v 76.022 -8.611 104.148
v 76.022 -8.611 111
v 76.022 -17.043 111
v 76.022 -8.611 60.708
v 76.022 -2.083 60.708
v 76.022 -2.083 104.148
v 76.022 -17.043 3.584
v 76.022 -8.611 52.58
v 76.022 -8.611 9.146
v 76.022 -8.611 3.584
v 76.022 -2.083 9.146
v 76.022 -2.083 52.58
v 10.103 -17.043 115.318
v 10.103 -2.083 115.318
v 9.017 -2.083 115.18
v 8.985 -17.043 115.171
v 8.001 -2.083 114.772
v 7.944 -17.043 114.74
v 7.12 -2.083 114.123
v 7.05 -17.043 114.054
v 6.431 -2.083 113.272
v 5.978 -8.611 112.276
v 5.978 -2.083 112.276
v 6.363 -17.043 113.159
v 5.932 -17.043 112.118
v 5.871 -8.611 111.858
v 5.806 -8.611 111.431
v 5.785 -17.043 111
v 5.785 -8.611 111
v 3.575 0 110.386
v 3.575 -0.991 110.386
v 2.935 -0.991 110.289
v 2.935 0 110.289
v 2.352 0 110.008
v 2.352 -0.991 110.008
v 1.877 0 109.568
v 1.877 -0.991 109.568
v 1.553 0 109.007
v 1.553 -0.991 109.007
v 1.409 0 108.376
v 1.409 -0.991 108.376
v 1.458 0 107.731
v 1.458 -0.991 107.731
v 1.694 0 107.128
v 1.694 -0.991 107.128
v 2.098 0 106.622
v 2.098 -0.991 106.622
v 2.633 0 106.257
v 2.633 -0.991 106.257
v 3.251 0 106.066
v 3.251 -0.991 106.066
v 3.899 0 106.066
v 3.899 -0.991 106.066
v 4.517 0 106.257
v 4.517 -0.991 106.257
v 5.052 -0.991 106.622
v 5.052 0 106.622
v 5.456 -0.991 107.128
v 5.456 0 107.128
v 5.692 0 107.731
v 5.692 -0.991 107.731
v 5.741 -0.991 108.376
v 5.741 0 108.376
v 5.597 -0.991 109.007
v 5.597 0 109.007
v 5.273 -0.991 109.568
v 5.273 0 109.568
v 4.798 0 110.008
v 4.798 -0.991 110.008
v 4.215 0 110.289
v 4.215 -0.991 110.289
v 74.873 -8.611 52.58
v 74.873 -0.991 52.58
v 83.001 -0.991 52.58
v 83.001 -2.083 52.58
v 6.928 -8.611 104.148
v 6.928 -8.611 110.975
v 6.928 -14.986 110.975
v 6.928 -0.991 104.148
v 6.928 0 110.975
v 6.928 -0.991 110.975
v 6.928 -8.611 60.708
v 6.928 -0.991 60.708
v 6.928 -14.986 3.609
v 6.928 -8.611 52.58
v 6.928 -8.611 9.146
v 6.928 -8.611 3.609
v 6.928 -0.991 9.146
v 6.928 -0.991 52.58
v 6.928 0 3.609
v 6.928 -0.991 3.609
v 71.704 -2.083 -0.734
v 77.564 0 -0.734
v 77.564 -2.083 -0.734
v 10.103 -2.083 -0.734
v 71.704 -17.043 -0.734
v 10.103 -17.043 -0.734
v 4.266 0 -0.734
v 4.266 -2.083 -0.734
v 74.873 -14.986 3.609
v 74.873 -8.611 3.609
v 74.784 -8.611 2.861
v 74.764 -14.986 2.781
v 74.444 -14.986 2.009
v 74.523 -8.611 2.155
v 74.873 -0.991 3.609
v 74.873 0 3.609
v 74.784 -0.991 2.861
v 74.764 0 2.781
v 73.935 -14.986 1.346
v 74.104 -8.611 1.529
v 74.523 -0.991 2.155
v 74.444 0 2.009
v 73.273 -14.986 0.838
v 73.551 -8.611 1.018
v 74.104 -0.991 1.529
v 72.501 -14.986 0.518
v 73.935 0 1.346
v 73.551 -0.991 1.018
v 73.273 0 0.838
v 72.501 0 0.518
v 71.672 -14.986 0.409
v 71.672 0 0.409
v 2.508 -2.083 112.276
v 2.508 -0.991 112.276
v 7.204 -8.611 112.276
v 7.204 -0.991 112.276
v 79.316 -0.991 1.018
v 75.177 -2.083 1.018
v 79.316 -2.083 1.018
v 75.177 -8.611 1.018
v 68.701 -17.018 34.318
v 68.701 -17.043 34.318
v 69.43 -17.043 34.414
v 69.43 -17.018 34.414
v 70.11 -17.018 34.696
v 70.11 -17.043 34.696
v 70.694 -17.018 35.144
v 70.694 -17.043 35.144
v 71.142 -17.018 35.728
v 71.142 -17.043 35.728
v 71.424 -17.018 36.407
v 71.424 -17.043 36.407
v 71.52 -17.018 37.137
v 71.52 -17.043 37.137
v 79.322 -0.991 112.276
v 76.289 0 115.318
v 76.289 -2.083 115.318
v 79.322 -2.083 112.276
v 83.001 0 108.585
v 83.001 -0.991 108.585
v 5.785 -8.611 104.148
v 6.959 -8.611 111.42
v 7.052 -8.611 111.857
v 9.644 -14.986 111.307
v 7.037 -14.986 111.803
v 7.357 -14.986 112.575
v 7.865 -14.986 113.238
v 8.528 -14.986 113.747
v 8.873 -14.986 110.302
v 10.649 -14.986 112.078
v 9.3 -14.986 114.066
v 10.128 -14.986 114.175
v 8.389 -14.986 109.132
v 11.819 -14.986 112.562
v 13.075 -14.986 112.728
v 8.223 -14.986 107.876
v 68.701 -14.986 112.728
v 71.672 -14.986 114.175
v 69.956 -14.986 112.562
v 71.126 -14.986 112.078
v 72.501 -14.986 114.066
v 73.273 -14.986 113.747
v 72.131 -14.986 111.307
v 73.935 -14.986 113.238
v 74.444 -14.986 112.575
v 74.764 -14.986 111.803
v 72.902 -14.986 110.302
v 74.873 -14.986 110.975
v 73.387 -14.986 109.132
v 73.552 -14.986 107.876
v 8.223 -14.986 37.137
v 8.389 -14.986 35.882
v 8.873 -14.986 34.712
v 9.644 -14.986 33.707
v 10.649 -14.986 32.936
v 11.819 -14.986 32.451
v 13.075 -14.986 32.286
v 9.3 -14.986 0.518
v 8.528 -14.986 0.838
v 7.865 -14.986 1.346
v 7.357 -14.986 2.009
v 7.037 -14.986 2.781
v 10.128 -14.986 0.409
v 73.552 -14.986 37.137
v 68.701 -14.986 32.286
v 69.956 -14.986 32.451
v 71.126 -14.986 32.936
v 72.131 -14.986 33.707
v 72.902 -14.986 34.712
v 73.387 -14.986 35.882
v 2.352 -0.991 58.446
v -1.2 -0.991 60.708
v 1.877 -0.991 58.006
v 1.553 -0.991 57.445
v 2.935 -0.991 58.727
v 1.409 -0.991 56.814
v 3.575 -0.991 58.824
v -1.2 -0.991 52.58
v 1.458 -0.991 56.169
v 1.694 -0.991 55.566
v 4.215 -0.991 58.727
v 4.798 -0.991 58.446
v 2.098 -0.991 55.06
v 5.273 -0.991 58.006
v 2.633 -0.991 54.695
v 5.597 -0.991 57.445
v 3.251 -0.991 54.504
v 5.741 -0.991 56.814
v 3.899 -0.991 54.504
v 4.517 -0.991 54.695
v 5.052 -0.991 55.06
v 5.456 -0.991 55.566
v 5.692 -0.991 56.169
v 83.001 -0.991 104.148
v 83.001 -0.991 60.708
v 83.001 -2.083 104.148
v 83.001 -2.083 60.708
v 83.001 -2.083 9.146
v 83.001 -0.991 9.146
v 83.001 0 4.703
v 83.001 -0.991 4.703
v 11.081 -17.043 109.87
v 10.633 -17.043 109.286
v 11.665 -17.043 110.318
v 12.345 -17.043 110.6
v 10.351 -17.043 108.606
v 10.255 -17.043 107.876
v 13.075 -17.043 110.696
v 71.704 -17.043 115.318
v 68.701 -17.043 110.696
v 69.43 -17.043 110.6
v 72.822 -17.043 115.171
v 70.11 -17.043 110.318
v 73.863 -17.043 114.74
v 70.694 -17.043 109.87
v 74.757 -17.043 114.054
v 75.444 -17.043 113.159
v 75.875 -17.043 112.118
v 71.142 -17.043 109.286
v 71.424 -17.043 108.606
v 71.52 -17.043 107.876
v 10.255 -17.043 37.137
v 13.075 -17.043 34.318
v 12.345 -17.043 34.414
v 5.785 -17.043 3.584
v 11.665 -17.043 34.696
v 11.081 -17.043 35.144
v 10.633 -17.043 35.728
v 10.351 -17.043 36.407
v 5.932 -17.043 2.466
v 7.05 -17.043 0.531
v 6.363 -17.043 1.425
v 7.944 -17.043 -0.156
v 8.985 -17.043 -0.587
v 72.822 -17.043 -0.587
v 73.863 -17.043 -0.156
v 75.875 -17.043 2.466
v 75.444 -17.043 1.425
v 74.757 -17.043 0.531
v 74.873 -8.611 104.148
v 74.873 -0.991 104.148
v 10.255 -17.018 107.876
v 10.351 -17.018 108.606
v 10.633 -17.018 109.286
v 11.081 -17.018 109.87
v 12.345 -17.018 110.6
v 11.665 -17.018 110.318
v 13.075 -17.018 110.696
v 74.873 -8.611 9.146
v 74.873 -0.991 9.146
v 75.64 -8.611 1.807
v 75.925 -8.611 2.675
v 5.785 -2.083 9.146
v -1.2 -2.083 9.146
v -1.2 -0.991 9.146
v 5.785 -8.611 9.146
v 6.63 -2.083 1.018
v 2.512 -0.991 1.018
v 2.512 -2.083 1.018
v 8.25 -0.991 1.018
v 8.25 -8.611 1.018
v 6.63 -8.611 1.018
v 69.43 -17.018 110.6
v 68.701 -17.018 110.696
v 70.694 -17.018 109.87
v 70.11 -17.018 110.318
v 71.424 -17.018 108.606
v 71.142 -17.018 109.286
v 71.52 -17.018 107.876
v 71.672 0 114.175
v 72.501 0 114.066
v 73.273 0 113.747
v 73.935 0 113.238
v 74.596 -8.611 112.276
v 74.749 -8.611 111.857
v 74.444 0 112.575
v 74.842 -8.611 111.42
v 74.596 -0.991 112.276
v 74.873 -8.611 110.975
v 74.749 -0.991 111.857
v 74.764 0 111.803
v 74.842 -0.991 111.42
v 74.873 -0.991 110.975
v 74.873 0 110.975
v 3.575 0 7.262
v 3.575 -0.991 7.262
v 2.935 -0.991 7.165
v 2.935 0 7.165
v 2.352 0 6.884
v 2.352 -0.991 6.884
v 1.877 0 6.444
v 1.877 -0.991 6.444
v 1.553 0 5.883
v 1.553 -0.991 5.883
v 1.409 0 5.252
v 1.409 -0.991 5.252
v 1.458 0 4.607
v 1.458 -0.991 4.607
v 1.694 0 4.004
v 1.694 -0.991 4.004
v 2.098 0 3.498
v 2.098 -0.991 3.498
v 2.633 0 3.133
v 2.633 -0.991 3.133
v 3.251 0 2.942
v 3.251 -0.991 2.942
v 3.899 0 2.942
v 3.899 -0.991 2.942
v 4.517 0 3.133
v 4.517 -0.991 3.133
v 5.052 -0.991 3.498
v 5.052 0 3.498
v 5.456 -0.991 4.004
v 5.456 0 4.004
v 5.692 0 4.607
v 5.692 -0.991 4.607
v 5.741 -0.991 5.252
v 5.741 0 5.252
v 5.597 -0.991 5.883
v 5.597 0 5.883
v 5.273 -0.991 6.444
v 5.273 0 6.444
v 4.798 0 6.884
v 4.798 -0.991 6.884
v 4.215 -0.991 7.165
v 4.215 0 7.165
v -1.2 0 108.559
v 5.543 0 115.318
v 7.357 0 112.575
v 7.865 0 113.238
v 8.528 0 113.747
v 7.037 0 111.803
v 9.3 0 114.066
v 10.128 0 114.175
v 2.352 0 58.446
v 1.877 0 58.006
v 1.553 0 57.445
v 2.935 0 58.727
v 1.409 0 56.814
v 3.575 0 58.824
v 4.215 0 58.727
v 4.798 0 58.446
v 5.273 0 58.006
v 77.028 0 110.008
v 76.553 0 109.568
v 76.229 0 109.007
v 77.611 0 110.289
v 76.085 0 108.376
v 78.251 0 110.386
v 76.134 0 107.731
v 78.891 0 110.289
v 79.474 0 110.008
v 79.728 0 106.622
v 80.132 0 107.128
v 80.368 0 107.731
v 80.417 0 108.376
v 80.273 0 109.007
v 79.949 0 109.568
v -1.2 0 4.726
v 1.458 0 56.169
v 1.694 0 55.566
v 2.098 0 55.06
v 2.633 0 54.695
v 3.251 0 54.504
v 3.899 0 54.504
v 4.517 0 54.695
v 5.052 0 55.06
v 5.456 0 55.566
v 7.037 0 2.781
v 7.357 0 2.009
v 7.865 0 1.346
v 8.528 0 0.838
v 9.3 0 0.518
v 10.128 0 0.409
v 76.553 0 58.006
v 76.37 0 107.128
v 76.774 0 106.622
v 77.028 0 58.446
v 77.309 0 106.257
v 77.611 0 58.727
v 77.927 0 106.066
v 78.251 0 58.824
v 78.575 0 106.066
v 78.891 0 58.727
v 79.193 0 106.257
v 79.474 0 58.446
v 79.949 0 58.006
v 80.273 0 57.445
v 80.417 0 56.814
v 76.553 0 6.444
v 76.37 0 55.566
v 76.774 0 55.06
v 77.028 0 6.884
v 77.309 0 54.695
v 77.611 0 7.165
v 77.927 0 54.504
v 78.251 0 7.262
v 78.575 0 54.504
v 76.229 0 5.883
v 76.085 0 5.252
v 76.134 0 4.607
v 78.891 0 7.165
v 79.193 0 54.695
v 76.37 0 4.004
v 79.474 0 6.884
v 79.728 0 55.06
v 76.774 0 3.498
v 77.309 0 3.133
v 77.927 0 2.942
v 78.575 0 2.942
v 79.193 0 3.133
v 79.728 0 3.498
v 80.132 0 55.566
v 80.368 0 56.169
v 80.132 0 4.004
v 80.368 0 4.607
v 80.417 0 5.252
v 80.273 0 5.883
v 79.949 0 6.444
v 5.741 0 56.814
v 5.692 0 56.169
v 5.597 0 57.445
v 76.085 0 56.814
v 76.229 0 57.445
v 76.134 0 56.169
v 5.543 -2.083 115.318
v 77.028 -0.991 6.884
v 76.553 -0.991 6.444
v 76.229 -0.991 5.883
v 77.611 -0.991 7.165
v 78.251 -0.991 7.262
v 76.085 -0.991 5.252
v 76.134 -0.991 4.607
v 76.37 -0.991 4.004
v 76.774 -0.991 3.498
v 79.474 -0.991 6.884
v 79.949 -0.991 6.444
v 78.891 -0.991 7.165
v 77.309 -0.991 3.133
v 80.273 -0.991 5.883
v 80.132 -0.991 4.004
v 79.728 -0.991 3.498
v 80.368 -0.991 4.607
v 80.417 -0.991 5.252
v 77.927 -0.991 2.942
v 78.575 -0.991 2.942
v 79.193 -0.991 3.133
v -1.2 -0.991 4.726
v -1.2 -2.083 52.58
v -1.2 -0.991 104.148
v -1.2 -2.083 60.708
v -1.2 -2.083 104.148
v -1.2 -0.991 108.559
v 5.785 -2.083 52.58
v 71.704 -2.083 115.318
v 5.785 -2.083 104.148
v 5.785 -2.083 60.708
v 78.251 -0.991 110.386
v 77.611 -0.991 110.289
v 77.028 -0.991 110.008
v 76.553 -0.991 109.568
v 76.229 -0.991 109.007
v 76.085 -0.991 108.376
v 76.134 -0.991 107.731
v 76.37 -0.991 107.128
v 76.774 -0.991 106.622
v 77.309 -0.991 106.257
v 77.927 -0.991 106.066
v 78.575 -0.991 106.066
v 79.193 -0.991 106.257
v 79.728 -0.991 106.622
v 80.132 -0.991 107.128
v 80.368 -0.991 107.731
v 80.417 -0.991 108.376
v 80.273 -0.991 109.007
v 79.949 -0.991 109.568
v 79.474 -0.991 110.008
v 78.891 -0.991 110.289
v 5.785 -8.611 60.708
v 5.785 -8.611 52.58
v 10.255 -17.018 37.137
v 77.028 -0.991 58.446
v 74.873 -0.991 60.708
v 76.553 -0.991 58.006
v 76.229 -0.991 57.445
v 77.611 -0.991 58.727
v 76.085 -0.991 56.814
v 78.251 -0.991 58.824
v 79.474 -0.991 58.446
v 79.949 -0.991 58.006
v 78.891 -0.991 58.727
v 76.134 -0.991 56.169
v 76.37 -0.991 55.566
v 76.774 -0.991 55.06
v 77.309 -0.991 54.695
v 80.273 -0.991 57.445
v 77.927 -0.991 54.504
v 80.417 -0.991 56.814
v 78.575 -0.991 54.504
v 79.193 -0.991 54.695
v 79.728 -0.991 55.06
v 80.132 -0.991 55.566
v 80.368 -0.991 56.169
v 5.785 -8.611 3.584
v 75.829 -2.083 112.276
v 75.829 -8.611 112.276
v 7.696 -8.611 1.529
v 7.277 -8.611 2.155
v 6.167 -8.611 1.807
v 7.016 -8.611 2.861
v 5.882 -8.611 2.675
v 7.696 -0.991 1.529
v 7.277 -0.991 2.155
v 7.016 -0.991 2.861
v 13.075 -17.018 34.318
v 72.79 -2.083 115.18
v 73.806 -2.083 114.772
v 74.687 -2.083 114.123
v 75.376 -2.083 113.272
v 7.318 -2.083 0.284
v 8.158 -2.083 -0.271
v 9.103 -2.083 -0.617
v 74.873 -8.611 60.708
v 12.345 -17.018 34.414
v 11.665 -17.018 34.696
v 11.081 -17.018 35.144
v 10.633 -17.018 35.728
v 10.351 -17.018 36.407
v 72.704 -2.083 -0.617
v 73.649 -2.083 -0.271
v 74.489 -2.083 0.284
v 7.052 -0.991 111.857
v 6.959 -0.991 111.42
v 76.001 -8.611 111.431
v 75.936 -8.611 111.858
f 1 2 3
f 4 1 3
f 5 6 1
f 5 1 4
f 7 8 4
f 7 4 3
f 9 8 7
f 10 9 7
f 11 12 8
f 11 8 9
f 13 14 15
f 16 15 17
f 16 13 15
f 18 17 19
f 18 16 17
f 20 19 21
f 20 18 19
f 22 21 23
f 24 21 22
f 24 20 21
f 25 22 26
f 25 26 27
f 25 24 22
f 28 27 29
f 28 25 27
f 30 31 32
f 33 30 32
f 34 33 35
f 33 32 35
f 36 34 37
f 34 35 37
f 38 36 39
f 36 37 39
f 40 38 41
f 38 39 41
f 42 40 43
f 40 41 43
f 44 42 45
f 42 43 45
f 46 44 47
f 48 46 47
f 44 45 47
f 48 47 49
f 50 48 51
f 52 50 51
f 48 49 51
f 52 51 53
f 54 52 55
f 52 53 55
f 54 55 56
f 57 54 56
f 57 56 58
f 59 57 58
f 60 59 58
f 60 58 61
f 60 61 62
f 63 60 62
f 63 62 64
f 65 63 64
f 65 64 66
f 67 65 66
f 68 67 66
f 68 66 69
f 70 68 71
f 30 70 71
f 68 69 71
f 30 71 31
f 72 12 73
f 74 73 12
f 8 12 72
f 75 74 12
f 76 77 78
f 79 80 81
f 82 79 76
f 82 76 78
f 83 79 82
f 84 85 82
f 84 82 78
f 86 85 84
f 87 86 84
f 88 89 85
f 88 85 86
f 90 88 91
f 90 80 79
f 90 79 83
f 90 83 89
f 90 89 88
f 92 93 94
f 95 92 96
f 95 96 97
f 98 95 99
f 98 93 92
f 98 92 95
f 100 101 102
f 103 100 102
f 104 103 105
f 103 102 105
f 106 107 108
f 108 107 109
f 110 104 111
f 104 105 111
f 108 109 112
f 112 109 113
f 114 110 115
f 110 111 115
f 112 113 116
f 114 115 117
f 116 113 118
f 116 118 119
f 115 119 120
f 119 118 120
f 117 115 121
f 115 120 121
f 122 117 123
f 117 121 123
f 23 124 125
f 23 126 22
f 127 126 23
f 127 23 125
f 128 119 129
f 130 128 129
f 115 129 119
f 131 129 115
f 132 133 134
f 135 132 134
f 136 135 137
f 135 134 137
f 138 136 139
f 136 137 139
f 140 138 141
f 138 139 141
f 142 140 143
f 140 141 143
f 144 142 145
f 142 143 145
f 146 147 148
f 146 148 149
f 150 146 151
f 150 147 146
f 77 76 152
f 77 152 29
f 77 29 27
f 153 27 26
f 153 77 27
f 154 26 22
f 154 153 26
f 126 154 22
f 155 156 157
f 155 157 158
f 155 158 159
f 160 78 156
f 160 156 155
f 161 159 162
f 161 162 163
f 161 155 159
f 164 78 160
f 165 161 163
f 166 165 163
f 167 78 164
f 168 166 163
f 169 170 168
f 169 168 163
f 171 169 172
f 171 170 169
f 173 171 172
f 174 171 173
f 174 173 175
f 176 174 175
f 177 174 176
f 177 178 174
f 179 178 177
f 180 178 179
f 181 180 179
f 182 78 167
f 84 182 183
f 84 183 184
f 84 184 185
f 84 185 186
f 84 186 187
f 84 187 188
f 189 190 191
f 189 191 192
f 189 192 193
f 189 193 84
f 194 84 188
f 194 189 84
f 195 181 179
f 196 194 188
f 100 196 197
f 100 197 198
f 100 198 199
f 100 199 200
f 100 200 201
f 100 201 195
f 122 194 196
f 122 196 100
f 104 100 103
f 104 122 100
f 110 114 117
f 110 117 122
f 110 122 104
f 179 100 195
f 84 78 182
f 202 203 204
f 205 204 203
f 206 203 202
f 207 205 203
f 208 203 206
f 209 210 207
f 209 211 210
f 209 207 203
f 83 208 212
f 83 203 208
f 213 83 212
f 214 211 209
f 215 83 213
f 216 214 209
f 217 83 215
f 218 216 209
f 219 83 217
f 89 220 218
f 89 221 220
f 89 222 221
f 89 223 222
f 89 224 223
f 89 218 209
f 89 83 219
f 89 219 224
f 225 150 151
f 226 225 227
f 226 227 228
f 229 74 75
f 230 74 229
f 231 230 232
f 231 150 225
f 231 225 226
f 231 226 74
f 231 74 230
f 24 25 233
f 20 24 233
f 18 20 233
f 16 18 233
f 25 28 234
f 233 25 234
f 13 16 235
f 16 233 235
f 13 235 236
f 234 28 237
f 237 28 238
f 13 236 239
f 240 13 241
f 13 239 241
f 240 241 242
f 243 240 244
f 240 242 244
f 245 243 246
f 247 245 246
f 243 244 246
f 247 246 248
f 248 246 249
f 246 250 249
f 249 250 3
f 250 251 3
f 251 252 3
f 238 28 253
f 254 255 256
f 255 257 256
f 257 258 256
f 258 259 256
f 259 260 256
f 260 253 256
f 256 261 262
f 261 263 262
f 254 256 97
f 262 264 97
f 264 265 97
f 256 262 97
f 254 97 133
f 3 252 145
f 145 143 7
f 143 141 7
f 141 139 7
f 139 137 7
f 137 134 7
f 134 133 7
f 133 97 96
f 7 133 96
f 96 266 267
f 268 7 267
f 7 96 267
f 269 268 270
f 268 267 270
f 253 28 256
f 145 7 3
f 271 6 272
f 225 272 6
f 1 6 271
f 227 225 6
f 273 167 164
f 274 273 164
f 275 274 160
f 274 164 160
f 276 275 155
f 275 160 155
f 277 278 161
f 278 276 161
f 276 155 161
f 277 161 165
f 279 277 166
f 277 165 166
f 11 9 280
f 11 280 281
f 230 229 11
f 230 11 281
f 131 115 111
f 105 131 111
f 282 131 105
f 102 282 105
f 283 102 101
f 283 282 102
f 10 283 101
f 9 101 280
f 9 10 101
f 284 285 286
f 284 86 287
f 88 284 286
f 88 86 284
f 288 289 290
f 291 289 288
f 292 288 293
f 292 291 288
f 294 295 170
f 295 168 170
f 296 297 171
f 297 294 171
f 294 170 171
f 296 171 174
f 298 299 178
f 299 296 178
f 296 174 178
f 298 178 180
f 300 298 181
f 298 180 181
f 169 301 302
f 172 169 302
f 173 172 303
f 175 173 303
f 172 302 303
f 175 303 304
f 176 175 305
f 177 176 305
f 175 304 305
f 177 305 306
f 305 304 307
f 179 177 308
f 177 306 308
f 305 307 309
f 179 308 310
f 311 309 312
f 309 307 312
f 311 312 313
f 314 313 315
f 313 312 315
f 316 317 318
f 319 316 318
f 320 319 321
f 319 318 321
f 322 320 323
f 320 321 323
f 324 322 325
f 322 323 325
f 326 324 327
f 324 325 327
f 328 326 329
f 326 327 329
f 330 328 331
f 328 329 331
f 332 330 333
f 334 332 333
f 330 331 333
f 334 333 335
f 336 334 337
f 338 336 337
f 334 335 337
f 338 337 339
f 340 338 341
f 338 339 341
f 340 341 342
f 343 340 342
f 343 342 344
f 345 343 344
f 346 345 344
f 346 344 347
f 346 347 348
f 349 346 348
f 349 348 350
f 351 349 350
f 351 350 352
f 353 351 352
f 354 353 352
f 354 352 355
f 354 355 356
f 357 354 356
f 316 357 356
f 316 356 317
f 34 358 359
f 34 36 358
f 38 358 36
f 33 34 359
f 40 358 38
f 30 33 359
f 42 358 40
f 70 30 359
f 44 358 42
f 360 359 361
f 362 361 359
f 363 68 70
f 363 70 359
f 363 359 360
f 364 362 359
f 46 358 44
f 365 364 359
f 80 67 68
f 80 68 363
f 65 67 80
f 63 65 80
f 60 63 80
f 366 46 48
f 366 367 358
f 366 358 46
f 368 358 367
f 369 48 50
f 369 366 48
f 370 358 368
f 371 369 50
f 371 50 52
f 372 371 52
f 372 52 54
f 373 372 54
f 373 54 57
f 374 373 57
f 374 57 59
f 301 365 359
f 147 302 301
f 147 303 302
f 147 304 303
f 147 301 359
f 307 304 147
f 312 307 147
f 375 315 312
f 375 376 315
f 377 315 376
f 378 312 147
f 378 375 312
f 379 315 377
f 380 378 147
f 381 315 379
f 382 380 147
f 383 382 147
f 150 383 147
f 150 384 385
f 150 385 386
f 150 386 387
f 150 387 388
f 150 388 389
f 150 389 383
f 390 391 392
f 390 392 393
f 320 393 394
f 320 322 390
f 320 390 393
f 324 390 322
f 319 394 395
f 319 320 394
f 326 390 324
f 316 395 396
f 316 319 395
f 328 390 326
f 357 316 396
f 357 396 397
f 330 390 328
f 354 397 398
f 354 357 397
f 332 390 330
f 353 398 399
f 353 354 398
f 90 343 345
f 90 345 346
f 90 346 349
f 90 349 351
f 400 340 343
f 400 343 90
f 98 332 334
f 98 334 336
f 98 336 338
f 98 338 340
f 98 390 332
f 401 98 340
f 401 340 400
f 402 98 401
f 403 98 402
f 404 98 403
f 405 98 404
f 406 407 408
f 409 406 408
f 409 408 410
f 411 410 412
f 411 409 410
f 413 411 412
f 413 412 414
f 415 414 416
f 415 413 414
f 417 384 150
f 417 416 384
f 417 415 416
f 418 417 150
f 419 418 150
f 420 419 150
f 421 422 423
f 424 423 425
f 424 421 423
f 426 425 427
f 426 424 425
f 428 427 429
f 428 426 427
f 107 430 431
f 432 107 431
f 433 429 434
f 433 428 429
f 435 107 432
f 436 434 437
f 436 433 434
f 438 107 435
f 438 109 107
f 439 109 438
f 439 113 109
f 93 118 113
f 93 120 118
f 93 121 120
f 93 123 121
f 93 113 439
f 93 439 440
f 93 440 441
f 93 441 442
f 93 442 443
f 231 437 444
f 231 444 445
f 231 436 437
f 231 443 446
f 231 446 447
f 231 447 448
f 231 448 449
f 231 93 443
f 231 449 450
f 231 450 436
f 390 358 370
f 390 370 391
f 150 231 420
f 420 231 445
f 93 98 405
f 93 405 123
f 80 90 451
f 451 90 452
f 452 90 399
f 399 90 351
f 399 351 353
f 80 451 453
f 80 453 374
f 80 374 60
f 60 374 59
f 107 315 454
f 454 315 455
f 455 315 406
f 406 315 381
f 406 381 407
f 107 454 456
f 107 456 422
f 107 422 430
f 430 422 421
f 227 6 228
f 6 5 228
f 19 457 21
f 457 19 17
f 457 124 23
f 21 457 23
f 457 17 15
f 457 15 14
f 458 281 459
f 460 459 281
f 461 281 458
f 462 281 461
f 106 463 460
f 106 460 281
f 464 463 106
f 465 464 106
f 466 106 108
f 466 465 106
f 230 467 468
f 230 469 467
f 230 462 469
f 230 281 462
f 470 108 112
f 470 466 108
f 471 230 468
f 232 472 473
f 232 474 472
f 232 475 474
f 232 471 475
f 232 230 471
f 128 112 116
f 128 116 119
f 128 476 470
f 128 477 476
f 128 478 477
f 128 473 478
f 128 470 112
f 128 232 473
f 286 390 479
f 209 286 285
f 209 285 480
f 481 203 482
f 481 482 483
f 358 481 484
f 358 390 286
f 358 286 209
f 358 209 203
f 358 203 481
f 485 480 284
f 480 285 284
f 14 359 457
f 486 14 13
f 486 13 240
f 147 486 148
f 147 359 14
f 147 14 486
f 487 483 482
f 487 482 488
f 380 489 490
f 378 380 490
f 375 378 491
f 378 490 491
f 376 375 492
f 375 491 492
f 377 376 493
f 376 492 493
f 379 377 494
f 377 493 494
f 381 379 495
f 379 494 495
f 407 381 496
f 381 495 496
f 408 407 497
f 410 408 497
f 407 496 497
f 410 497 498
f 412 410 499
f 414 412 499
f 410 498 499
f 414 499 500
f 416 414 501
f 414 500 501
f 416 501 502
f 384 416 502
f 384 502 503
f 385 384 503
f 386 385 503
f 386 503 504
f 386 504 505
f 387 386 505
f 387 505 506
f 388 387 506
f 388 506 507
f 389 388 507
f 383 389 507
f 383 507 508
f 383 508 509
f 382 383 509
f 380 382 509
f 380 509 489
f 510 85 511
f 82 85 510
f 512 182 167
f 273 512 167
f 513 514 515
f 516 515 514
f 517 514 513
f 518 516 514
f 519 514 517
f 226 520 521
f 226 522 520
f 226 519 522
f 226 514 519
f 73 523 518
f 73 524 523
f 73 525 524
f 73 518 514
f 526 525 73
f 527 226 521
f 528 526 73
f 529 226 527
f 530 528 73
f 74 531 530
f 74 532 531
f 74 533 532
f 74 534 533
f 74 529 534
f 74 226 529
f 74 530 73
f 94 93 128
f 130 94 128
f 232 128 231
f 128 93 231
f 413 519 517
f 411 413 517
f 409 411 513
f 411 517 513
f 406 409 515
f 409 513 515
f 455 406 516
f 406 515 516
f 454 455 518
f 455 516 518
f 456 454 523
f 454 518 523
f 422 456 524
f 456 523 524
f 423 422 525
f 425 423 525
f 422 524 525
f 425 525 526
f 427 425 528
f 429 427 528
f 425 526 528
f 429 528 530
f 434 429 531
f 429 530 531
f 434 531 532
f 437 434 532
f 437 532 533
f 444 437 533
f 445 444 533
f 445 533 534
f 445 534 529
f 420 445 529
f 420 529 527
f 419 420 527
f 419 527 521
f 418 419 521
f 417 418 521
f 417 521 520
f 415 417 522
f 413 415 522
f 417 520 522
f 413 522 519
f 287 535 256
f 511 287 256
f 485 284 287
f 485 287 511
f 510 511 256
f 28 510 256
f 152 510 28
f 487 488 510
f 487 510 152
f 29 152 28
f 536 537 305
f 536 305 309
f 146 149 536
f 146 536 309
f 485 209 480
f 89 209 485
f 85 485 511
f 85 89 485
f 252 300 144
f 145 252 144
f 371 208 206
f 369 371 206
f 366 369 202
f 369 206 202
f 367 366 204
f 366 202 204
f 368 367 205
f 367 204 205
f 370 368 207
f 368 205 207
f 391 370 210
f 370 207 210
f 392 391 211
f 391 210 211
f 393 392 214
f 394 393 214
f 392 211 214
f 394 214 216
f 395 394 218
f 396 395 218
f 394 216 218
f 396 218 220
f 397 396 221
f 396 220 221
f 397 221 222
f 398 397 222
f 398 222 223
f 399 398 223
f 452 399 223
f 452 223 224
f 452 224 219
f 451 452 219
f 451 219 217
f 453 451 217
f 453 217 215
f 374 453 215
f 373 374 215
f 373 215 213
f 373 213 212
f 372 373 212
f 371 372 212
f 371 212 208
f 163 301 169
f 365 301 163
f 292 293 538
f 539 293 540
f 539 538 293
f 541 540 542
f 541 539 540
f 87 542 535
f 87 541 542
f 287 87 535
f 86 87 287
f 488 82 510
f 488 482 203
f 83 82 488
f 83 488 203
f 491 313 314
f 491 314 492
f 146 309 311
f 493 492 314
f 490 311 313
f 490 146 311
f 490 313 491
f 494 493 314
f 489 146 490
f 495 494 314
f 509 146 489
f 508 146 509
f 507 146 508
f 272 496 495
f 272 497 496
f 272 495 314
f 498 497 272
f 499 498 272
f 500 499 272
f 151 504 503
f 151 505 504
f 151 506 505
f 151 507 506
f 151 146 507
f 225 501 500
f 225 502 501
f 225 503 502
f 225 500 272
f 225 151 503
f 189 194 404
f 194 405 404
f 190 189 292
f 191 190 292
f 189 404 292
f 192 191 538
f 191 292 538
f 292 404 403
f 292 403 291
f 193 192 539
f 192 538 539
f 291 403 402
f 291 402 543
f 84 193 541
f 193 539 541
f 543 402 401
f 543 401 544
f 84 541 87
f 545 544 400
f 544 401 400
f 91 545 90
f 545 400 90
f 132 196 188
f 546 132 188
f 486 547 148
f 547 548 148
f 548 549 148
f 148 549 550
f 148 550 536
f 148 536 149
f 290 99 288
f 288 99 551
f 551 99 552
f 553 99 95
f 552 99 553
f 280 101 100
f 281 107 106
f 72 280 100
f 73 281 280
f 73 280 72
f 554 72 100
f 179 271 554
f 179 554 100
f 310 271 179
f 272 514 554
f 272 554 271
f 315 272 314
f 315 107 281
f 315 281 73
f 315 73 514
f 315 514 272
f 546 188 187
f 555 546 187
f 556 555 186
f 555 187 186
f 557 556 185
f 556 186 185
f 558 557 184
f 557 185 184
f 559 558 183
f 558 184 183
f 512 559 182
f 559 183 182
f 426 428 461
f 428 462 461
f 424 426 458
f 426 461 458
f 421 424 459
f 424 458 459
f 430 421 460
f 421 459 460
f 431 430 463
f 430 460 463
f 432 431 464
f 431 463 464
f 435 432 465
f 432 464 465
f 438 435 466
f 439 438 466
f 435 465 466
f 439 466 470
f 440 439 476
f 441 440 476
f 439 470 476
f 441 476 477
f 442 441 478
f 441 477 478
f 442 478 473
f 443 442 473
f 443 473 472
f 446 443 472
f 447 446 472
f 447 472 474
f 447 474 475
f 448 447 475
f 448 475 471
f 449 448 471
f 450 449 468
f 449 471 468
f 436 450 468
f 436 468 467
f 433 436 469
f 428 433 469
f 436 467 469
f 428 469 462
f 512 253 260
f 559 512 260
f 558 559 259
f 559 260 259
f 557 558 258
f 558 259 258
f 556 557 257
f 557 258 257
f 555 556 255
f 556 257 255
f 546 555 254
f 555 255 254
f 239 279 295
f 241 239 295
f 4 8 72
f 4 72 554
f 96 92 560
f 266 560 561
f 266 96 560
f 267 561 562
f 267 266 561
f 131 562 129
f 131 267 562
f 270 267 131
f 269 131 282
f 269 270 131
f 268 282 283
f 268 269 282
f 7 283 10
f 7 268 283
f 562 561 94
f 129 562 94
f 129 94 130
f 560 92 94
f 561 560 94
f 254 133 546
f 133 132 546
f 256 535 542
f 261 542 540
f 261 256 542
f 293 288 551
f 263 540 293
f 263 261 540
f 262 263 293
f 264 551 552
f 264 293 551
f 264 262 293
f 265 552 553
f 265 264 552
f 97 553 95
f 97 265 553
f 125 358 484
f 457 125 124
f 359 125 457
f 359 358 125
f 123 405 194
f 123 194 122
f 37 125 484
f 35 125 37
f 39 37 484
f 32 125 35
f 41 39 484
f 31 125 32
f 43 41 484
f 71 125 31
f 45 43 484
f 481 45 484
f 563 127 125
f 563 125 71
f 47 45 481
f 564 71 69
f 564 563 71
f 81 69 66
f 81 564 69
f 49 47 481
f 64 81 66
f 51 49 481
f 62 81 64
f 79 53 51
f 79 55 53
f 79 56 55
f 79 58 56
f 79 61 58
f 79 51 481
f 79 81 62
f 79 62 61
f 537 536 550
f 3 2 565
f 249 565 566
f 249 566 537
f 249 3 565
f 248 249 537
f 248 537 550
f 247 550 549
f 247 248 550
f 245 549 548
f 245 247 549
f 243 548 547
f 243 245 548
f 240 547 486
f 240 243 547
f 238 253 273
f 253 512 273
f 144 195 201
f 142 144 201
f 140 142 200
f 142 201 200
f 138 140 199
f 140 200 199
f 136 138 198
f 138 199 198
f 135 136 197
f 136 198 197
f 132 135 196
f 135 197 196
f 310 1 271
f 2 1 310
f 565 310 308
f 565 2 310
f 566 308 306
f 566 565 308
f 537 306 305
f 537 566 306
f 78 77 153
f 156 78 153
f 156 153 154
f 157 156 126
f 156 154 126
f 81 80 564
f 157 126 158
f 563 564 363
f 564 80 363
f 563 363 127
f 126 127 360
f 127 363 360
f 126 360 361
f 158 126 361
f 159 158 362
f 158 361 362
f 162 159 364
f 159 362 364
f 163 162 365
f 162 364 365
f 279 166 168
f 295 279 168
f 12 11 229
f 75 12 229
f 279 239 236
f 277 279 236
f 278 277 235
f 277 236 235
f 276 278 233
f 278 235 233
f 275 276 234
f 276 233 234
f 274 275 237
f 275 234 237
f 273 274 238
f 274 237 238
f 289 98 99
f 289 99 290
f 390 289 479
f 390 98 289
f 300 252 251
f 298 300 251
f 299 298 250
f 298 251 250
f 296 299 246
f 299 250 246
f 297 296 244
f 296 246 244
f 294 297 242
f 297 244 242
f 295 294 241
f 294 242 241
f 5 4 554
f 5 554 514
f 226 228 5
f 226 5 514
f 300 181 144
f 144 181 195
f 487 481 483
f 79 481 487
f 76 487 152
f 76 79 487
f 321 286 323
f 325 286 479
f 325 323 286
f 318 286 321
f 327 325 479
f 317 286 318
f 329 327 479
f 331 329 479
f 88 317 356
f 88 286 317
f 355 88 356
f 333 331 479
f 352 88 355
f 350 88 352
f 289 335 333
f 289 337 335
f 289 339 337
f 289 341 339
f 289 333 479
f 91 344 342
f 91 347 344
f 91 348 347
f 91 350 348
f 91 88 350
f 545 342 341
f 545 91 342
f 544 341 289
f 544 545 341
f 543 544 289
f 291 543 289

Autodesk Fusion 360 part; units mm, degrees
sketch "Front" plane through (0, 0, 0) normal (0, 1, 0) x (1, 0, 0) in component "2004699A"
  line L0 (-34.4613, 0.7342) -> (100.7673, 0.7342) construction
  line L1 (-34.854, -115.3184) -> (120.0108, -115.3184) construction
  line L2 (39.1093, -14.9122) -> (120.6654, -14.9122) construction
  line L3 (3.575, 24.5274) -> (3.575, -141.9882) construction
  line L4 (78.251, 23.8729) -> (78.251, -119.9956) construction
  line L5 (-16.7886, -108.2138) -> (88.0691, -108.2138) construction
  line L6 (-18.2286, -5.0898) -> (85.3201, -5.0898) construction
  line L7 (-8.6723, -56.6518) -> (96.0546, -56.6518) construction
  line L8 (-24.3813, -113.9722) -> (90.4255, -113.9722) construction
  line L9 (-27.0881, -0.4088) -> (83.5136, -0.4088) construction
  line L10 (10.2552, -130.527) -> (10.2552, 10.1996) construction
  line L11 (71.52, -130.1852) -> (71.52, 12.6775) construction
  line L12 (5.7848, -130.0998) -> (5.7848, 6.3546) construction
  line L13 (83.0008, -137.1267) -> (83.0008, 10.6162) construction
  line L14 (-1.2002, -137.339) -> (-1.2002, 17.644) construction
  line L15 (110.5413, -110.6956) -> (5.7848, -110.6956) construction
  line L16 (110.1974, -34.3178) -> (-2.9547, -34.3178) construction
  line L17 (102.8889, -60.7158) -> (-8.8875, -60.7158) construction
  line L18 (102.459, -52.5878) -> (-11.4669, -52.5878) construction
  line L19 (40.913, -17.1802) -> (40.913, 17.1835) construction
  line L20 (69.6478, 8.6501) -> (89.4046, -11.1067) construction
  line L21 (-5.4342, -8.9542) -> (10.2552, 6.7154) construction
  line L22 (-6.1303, -103.6453) -> (12.6902, -122.4658) construction
  line L23 (73.7302, -117.8806) -> (90.3753, -101.2137) construction
  line L24 (-2.868, -104.1498) -> (87.443, -104.1498) construction
  line L25 (-3.4391, -112.2778) -> (87.0011, -112.2778) construction
  line L26 (-3.1536, -9.1538) -> (86.0732, -9.1538) construction
  line L27 (-3.3677, -1.0258) -> (85.288, -1.0258) construction
  line L28 (10.2552, -110.6956) -> (71.52, -110.6956)
  line L29 (71.52, -110.6956) -> (71.52, -34.3178)
  line L30 (71.52, -34.3178) -> (10.2552, -34.3178)
  line L31 (10.2552, -34.3178) -> (10.2552, -110.6956)
  line L32 (-1.2002, -115.3184) -> (83.0008, -115.3184)
  line L33 (83.0008, -115.3184) -> (83.0008, 0.7342)
  line L34 (83.0008, 0.7342) -> (-1.2002, 0.7342)
  line L35 (-1.2002, 0.7342) -> (-1.2002, -115.3184)
  line L36 (76.0158, -119.9569) -> (76.0158, 9.6762) construction
  line L37 (5.7848, -115.3184) -> (76.0222, -115.3184) construction
  line L38 (76.0222, -115.3184) -> (76.0222, 0.7342) construction
  line L39 (76.0222, 0.7342) -> (5.7848, 0.7342) construction
  line L40 (5.7848, 0.7342) -> (5.7848, -115.3184) construction
  line L41 (76.0222, 0.7342) -> (5.7848, 0.7342)
  line L42 (5.7848, 0.7342) -> (5.7848, -115.3184)
  line L43 (5.7848, -115.3184) -> (76.0222, -115.3184)
  line L44 (76.0222, -115.3184) -> (76.0222, 0.7342)
  line L45 (-1.2002, -108.5588) -> (5.5429, -115.3184)
  line L46 (76.2891, -115.3184) -> (83.0008, -108.585)
  line L47 (77.5637, 0.7342) -> (83.0008, -4.7029)
  line L48 (4.2664, 0.7342) -> (-1.2002, -4.7255)
  point P0 (3.575, -108.2138)
  point P1 (78.251, -108.2138)
  point P2 (78.251, -56.6518)
  point P3 (78.251, -5.0898)
  point P4 (3.575, -5.0898)
  point P5 (3.575, -56.6518)
  dimension "d1" = 1.143
  dimension "d2" = 116.0526
  dimension "d3" = 113.5634
  dimension "d4" = 103.124
  dimension "d5" = 51.562
  dimension "d6" = 74.676
  dimension "d7" = 2.2098
  dimension "d8" = 4.4704
  dimension "d9" = 61.2648
  dimension "d10" = 84.201
  dimension "d11" = 6.985
  dimension "d12" = 76.3778
  dimension "d13" = 4.6228
  dimension "d14" = 100.4062
  dimension "d15" = 37.338
  dimension "d16" = 8.128
  dimension "d17" = 4.064
  dimension "d18" = 3.6322
  dimension "d19" = 3.6322
  dimension "d20" = 3.6322
  dimension "d21" = 3.6322
  dimension "d22" = 4.064
  dimension "d23" = 8.128
  dimension "d25" = 4.064
  dimension "d26" = 8.128
  dimension "d27" = 70.231
extrude "Extrude1" add sketch "Front" against normal blind 17.0434 contours L32 L34 L41 L42 L43 L44 in component "2004699A"
extrude "Extrude2" add sketch "Front" against normal blind 2.0828 contours L32 L34 L35 L42 L45 L48 | L32 L33 L34 L44 L46 L47 in component "2004699A"
fillet "Fillet1" radius 4.318 4 edges at (5.7848, -9.5631, -0.7342) (76.0222, -9.5631, -0.7342) (76.0222, -9.5631, 115.3184) (5.7848, -9.5631, 115.3184) in component "2004699A"
fillet "Fillet2" radius 2.8194 4 edges at (71.52, -8.5217, 110.6956) (10.2552, -8.5217, 110.6956) (71.52, -8.5217, 34.3178) (10.2552, -8.5217, 34.3178) in component "2004699A"
hole "Hole1" at (78.251, 0, 108.2138) at (78.251, 0, 56.6518) at (78.251, 0, 5.0898) at (3.575, 0, 5.0898) at (3.575, 0, 56.6518) at (3.575, 0, 108.2138) direction (0, -1, 0) diameter 4.3434 end through all in component "2004699A"
sketch "Sketch3" plane through (0, 0, 0) normal (0, 1, 0) x (1, 0, 0) in component "2004699A"
  line L0 (88.5571, -114.1754) -> (-29.017, -114.1754) construction
  line L1 (6.9278, -119.135) -> (6.9278, -3.6092) construction
  line L2 (74.8728, -110.975) -> (74.8728, 6.1599) construction
  line L3 (95.5329, -0.4088) -> (-26.782, -0.4088) construction
  line L4 (-34.4613, 0.7342) -> (100.7673, 0.7342) construction
  line L5 (5.7848, -130.0998) -> (5.7848, 6.3546) construction
  line L6 (-34.854, -115.3184) -> (120.0108, -115.3184) construction
  line L7 (76.0158, -119.9569) -> (76.0158, 9.6762) construction
  line L8 (71.6724, -114.1754) -> (10.1282, -114.1754)
  line L9 (6.9278, -110.975) -> (6.9278, -0.4088)
  line L10 (10.1282, -0.4088) -> (71.6724, -0.4088)
  line L11 (74.8728, -3.6092) -> (74.8728, -114.1754)
  arc A0 (74.8728, -3.6092) -> (71.6724, -0.4088) centre (71.6724, -3.6092) ccw
  arc A1 (10.1282, -0.4088) -> (6.9278, -3.6092) centre (10.1282, -3.6092) ccw
  arc A2 (71.6724, -114.1754) -> (74.8728, -110.975) centre (71.6724, -110.975) ccw
  arc A3 (6.9278, -110.975) -> (10.1282, -114.1754) centre (10.1282, -110.975) ccw
  dimension "d37" = 1.143
  dimension "d38" = 1.143
  dimension "d39" = 1.143
  dimension "d40" = 1.143
  dimension "d41" = 3.2004
  dimension "d42" = 3.2004
  dimension "d43" = 3.2004
  dimension "d44" = 3.2004
extrude "Extrude3" cut sketch "Sketch3" against normal blind 14.986 in component "2004699A"
chamfer "Chamfer1" distance 2.032 angle 45 8 edges at (40.8876, -14.986, 34.3178) (11.081, -14.986, 35.1436) (10.2552, -14.986, 72.5067) (11.081, -14.986, 109.8698) (40.8876, -14.986, 110.6956) (70.6942, -14.986, 109.8698) (71.52, -14.986, 72.5067) (70.6942, -14.986, 35.1436) in component "2004699A"
sketch "Sketch4" plane through (83.0008, 0, 0) normal (1, 0, 0) x (0, 1, 0) in component "2004699A"
  line L0 (0, 4.7029) -> (0, 108.585)
  line L1 (0, 108.585) -> (-2.0828, 108.585)
  line L2 (-2.0828, 108.585) -> (-2.0828, 4.7029)
  line L3 (-2.0828, 4.7029) -> (0, 4.7029)
  line L4 (-0.9906, 121.8672) -> (-0.9906, -5.2486) construction
  line L5 (0, 108.2121) -> (-3.3976, 108.2121) construction
  line L6 (0, 56.644) -> (-3.817, 56.644) construction
  line L7 (0, 0) -> (-1.1062, 0) construction
  line L8 (1.8872, 112.2761) -> (-9.9271, 112.2761) construction
  line L9 (1.8112, 104.1481) -> (-10.4595, 104.1481) construction
  line L10 (1.71, 60.708) -> (-9.8241, 60.708) construction
  line L11 (2.1656, 52.58) -> (0.9254, 52.58) construction
  line L12 (0.9254, 52.58) -> (-9.5412, 52.58) construction
  line L13 (0, 5.0822) -> (-6.1548, 5.0822) construction
  line L14 (2.1892, 9.1462) -> (-10.0058, 9.1462) construction
  line L15 (2.6197, 1.0182) -> (-10.581, 1.0182) construction
  line L16 (-8.6106, 122.6091) -> (-8.6106, -10.4565) construction
  line L17 (-8.6106, 60.708) -> (-0.9906, 60.708)
  line L18 (-0.9906, 60.708) -> (-0.9906, 52.58)
  line L19 (-0.9906, 52.58) -> (-8.6106, 52.58)
  line L20 (-8.6106, 52.58) -> (-8.6106, 60.708)
  line L21 (-8.6106, 9.1462) -> (-0.9906, 9.1462)
  line L22 (-0.9906, 9.1462) -> (-0.9906, 1.0182)
  line L23 (-0.9906, 1.0182) -> (-8.6106, 1.0182)
  line L24 (-8.6106, 1.0182) -> (-8.6106, 9.1462)
  line L25 (-8.6106, 112.2761) -> (-0.9906, 112.2761)
  line L26 (-0.9906, 112.2761) -> (-0.9906, 104.1481)
  line L27 (-0.9906, 104.1481) -> (-8.6106, 104.1481)
  line L28 (-8.6106, 104.1481) -> (-8.6106, 112.2761)
  point P0 (0, 119.9956)
  dimension "d48" = 0.9906
  dimension "d49" = 4.064
  dimension "d50" = 8.128
  dimension "d51" = 4.064
  dimension "d52" = 8.128
  dimension "d54" = 4.064
  dimension "d55" = 8.128
  dimension "d56" = 7.62
extrude "Extrude4" cut sketch "Sketch4" against normal through all contours L2 L3 L21 L22 L23 L24 | L2 L3 L21 L22 | L1 L2 L26 L27 | L1 L2 L25 L26 L27 L28 | L2 L17 L19 L20 | L2 L17 L18 L19 in component "2004699A"
component "2004699A" placed x (1, 0, 0) y (0, 1, 0) z (0, 0, 1) at (0, 0, 0)
equation "d41 = 0.171 in - 0.045 in"
equation "d42 = 0.171 in - 0.045 in"
equation "d43 = 0.171 in - 0.045 in"
equation "d44 = 0.171 in - 0.045 in"
